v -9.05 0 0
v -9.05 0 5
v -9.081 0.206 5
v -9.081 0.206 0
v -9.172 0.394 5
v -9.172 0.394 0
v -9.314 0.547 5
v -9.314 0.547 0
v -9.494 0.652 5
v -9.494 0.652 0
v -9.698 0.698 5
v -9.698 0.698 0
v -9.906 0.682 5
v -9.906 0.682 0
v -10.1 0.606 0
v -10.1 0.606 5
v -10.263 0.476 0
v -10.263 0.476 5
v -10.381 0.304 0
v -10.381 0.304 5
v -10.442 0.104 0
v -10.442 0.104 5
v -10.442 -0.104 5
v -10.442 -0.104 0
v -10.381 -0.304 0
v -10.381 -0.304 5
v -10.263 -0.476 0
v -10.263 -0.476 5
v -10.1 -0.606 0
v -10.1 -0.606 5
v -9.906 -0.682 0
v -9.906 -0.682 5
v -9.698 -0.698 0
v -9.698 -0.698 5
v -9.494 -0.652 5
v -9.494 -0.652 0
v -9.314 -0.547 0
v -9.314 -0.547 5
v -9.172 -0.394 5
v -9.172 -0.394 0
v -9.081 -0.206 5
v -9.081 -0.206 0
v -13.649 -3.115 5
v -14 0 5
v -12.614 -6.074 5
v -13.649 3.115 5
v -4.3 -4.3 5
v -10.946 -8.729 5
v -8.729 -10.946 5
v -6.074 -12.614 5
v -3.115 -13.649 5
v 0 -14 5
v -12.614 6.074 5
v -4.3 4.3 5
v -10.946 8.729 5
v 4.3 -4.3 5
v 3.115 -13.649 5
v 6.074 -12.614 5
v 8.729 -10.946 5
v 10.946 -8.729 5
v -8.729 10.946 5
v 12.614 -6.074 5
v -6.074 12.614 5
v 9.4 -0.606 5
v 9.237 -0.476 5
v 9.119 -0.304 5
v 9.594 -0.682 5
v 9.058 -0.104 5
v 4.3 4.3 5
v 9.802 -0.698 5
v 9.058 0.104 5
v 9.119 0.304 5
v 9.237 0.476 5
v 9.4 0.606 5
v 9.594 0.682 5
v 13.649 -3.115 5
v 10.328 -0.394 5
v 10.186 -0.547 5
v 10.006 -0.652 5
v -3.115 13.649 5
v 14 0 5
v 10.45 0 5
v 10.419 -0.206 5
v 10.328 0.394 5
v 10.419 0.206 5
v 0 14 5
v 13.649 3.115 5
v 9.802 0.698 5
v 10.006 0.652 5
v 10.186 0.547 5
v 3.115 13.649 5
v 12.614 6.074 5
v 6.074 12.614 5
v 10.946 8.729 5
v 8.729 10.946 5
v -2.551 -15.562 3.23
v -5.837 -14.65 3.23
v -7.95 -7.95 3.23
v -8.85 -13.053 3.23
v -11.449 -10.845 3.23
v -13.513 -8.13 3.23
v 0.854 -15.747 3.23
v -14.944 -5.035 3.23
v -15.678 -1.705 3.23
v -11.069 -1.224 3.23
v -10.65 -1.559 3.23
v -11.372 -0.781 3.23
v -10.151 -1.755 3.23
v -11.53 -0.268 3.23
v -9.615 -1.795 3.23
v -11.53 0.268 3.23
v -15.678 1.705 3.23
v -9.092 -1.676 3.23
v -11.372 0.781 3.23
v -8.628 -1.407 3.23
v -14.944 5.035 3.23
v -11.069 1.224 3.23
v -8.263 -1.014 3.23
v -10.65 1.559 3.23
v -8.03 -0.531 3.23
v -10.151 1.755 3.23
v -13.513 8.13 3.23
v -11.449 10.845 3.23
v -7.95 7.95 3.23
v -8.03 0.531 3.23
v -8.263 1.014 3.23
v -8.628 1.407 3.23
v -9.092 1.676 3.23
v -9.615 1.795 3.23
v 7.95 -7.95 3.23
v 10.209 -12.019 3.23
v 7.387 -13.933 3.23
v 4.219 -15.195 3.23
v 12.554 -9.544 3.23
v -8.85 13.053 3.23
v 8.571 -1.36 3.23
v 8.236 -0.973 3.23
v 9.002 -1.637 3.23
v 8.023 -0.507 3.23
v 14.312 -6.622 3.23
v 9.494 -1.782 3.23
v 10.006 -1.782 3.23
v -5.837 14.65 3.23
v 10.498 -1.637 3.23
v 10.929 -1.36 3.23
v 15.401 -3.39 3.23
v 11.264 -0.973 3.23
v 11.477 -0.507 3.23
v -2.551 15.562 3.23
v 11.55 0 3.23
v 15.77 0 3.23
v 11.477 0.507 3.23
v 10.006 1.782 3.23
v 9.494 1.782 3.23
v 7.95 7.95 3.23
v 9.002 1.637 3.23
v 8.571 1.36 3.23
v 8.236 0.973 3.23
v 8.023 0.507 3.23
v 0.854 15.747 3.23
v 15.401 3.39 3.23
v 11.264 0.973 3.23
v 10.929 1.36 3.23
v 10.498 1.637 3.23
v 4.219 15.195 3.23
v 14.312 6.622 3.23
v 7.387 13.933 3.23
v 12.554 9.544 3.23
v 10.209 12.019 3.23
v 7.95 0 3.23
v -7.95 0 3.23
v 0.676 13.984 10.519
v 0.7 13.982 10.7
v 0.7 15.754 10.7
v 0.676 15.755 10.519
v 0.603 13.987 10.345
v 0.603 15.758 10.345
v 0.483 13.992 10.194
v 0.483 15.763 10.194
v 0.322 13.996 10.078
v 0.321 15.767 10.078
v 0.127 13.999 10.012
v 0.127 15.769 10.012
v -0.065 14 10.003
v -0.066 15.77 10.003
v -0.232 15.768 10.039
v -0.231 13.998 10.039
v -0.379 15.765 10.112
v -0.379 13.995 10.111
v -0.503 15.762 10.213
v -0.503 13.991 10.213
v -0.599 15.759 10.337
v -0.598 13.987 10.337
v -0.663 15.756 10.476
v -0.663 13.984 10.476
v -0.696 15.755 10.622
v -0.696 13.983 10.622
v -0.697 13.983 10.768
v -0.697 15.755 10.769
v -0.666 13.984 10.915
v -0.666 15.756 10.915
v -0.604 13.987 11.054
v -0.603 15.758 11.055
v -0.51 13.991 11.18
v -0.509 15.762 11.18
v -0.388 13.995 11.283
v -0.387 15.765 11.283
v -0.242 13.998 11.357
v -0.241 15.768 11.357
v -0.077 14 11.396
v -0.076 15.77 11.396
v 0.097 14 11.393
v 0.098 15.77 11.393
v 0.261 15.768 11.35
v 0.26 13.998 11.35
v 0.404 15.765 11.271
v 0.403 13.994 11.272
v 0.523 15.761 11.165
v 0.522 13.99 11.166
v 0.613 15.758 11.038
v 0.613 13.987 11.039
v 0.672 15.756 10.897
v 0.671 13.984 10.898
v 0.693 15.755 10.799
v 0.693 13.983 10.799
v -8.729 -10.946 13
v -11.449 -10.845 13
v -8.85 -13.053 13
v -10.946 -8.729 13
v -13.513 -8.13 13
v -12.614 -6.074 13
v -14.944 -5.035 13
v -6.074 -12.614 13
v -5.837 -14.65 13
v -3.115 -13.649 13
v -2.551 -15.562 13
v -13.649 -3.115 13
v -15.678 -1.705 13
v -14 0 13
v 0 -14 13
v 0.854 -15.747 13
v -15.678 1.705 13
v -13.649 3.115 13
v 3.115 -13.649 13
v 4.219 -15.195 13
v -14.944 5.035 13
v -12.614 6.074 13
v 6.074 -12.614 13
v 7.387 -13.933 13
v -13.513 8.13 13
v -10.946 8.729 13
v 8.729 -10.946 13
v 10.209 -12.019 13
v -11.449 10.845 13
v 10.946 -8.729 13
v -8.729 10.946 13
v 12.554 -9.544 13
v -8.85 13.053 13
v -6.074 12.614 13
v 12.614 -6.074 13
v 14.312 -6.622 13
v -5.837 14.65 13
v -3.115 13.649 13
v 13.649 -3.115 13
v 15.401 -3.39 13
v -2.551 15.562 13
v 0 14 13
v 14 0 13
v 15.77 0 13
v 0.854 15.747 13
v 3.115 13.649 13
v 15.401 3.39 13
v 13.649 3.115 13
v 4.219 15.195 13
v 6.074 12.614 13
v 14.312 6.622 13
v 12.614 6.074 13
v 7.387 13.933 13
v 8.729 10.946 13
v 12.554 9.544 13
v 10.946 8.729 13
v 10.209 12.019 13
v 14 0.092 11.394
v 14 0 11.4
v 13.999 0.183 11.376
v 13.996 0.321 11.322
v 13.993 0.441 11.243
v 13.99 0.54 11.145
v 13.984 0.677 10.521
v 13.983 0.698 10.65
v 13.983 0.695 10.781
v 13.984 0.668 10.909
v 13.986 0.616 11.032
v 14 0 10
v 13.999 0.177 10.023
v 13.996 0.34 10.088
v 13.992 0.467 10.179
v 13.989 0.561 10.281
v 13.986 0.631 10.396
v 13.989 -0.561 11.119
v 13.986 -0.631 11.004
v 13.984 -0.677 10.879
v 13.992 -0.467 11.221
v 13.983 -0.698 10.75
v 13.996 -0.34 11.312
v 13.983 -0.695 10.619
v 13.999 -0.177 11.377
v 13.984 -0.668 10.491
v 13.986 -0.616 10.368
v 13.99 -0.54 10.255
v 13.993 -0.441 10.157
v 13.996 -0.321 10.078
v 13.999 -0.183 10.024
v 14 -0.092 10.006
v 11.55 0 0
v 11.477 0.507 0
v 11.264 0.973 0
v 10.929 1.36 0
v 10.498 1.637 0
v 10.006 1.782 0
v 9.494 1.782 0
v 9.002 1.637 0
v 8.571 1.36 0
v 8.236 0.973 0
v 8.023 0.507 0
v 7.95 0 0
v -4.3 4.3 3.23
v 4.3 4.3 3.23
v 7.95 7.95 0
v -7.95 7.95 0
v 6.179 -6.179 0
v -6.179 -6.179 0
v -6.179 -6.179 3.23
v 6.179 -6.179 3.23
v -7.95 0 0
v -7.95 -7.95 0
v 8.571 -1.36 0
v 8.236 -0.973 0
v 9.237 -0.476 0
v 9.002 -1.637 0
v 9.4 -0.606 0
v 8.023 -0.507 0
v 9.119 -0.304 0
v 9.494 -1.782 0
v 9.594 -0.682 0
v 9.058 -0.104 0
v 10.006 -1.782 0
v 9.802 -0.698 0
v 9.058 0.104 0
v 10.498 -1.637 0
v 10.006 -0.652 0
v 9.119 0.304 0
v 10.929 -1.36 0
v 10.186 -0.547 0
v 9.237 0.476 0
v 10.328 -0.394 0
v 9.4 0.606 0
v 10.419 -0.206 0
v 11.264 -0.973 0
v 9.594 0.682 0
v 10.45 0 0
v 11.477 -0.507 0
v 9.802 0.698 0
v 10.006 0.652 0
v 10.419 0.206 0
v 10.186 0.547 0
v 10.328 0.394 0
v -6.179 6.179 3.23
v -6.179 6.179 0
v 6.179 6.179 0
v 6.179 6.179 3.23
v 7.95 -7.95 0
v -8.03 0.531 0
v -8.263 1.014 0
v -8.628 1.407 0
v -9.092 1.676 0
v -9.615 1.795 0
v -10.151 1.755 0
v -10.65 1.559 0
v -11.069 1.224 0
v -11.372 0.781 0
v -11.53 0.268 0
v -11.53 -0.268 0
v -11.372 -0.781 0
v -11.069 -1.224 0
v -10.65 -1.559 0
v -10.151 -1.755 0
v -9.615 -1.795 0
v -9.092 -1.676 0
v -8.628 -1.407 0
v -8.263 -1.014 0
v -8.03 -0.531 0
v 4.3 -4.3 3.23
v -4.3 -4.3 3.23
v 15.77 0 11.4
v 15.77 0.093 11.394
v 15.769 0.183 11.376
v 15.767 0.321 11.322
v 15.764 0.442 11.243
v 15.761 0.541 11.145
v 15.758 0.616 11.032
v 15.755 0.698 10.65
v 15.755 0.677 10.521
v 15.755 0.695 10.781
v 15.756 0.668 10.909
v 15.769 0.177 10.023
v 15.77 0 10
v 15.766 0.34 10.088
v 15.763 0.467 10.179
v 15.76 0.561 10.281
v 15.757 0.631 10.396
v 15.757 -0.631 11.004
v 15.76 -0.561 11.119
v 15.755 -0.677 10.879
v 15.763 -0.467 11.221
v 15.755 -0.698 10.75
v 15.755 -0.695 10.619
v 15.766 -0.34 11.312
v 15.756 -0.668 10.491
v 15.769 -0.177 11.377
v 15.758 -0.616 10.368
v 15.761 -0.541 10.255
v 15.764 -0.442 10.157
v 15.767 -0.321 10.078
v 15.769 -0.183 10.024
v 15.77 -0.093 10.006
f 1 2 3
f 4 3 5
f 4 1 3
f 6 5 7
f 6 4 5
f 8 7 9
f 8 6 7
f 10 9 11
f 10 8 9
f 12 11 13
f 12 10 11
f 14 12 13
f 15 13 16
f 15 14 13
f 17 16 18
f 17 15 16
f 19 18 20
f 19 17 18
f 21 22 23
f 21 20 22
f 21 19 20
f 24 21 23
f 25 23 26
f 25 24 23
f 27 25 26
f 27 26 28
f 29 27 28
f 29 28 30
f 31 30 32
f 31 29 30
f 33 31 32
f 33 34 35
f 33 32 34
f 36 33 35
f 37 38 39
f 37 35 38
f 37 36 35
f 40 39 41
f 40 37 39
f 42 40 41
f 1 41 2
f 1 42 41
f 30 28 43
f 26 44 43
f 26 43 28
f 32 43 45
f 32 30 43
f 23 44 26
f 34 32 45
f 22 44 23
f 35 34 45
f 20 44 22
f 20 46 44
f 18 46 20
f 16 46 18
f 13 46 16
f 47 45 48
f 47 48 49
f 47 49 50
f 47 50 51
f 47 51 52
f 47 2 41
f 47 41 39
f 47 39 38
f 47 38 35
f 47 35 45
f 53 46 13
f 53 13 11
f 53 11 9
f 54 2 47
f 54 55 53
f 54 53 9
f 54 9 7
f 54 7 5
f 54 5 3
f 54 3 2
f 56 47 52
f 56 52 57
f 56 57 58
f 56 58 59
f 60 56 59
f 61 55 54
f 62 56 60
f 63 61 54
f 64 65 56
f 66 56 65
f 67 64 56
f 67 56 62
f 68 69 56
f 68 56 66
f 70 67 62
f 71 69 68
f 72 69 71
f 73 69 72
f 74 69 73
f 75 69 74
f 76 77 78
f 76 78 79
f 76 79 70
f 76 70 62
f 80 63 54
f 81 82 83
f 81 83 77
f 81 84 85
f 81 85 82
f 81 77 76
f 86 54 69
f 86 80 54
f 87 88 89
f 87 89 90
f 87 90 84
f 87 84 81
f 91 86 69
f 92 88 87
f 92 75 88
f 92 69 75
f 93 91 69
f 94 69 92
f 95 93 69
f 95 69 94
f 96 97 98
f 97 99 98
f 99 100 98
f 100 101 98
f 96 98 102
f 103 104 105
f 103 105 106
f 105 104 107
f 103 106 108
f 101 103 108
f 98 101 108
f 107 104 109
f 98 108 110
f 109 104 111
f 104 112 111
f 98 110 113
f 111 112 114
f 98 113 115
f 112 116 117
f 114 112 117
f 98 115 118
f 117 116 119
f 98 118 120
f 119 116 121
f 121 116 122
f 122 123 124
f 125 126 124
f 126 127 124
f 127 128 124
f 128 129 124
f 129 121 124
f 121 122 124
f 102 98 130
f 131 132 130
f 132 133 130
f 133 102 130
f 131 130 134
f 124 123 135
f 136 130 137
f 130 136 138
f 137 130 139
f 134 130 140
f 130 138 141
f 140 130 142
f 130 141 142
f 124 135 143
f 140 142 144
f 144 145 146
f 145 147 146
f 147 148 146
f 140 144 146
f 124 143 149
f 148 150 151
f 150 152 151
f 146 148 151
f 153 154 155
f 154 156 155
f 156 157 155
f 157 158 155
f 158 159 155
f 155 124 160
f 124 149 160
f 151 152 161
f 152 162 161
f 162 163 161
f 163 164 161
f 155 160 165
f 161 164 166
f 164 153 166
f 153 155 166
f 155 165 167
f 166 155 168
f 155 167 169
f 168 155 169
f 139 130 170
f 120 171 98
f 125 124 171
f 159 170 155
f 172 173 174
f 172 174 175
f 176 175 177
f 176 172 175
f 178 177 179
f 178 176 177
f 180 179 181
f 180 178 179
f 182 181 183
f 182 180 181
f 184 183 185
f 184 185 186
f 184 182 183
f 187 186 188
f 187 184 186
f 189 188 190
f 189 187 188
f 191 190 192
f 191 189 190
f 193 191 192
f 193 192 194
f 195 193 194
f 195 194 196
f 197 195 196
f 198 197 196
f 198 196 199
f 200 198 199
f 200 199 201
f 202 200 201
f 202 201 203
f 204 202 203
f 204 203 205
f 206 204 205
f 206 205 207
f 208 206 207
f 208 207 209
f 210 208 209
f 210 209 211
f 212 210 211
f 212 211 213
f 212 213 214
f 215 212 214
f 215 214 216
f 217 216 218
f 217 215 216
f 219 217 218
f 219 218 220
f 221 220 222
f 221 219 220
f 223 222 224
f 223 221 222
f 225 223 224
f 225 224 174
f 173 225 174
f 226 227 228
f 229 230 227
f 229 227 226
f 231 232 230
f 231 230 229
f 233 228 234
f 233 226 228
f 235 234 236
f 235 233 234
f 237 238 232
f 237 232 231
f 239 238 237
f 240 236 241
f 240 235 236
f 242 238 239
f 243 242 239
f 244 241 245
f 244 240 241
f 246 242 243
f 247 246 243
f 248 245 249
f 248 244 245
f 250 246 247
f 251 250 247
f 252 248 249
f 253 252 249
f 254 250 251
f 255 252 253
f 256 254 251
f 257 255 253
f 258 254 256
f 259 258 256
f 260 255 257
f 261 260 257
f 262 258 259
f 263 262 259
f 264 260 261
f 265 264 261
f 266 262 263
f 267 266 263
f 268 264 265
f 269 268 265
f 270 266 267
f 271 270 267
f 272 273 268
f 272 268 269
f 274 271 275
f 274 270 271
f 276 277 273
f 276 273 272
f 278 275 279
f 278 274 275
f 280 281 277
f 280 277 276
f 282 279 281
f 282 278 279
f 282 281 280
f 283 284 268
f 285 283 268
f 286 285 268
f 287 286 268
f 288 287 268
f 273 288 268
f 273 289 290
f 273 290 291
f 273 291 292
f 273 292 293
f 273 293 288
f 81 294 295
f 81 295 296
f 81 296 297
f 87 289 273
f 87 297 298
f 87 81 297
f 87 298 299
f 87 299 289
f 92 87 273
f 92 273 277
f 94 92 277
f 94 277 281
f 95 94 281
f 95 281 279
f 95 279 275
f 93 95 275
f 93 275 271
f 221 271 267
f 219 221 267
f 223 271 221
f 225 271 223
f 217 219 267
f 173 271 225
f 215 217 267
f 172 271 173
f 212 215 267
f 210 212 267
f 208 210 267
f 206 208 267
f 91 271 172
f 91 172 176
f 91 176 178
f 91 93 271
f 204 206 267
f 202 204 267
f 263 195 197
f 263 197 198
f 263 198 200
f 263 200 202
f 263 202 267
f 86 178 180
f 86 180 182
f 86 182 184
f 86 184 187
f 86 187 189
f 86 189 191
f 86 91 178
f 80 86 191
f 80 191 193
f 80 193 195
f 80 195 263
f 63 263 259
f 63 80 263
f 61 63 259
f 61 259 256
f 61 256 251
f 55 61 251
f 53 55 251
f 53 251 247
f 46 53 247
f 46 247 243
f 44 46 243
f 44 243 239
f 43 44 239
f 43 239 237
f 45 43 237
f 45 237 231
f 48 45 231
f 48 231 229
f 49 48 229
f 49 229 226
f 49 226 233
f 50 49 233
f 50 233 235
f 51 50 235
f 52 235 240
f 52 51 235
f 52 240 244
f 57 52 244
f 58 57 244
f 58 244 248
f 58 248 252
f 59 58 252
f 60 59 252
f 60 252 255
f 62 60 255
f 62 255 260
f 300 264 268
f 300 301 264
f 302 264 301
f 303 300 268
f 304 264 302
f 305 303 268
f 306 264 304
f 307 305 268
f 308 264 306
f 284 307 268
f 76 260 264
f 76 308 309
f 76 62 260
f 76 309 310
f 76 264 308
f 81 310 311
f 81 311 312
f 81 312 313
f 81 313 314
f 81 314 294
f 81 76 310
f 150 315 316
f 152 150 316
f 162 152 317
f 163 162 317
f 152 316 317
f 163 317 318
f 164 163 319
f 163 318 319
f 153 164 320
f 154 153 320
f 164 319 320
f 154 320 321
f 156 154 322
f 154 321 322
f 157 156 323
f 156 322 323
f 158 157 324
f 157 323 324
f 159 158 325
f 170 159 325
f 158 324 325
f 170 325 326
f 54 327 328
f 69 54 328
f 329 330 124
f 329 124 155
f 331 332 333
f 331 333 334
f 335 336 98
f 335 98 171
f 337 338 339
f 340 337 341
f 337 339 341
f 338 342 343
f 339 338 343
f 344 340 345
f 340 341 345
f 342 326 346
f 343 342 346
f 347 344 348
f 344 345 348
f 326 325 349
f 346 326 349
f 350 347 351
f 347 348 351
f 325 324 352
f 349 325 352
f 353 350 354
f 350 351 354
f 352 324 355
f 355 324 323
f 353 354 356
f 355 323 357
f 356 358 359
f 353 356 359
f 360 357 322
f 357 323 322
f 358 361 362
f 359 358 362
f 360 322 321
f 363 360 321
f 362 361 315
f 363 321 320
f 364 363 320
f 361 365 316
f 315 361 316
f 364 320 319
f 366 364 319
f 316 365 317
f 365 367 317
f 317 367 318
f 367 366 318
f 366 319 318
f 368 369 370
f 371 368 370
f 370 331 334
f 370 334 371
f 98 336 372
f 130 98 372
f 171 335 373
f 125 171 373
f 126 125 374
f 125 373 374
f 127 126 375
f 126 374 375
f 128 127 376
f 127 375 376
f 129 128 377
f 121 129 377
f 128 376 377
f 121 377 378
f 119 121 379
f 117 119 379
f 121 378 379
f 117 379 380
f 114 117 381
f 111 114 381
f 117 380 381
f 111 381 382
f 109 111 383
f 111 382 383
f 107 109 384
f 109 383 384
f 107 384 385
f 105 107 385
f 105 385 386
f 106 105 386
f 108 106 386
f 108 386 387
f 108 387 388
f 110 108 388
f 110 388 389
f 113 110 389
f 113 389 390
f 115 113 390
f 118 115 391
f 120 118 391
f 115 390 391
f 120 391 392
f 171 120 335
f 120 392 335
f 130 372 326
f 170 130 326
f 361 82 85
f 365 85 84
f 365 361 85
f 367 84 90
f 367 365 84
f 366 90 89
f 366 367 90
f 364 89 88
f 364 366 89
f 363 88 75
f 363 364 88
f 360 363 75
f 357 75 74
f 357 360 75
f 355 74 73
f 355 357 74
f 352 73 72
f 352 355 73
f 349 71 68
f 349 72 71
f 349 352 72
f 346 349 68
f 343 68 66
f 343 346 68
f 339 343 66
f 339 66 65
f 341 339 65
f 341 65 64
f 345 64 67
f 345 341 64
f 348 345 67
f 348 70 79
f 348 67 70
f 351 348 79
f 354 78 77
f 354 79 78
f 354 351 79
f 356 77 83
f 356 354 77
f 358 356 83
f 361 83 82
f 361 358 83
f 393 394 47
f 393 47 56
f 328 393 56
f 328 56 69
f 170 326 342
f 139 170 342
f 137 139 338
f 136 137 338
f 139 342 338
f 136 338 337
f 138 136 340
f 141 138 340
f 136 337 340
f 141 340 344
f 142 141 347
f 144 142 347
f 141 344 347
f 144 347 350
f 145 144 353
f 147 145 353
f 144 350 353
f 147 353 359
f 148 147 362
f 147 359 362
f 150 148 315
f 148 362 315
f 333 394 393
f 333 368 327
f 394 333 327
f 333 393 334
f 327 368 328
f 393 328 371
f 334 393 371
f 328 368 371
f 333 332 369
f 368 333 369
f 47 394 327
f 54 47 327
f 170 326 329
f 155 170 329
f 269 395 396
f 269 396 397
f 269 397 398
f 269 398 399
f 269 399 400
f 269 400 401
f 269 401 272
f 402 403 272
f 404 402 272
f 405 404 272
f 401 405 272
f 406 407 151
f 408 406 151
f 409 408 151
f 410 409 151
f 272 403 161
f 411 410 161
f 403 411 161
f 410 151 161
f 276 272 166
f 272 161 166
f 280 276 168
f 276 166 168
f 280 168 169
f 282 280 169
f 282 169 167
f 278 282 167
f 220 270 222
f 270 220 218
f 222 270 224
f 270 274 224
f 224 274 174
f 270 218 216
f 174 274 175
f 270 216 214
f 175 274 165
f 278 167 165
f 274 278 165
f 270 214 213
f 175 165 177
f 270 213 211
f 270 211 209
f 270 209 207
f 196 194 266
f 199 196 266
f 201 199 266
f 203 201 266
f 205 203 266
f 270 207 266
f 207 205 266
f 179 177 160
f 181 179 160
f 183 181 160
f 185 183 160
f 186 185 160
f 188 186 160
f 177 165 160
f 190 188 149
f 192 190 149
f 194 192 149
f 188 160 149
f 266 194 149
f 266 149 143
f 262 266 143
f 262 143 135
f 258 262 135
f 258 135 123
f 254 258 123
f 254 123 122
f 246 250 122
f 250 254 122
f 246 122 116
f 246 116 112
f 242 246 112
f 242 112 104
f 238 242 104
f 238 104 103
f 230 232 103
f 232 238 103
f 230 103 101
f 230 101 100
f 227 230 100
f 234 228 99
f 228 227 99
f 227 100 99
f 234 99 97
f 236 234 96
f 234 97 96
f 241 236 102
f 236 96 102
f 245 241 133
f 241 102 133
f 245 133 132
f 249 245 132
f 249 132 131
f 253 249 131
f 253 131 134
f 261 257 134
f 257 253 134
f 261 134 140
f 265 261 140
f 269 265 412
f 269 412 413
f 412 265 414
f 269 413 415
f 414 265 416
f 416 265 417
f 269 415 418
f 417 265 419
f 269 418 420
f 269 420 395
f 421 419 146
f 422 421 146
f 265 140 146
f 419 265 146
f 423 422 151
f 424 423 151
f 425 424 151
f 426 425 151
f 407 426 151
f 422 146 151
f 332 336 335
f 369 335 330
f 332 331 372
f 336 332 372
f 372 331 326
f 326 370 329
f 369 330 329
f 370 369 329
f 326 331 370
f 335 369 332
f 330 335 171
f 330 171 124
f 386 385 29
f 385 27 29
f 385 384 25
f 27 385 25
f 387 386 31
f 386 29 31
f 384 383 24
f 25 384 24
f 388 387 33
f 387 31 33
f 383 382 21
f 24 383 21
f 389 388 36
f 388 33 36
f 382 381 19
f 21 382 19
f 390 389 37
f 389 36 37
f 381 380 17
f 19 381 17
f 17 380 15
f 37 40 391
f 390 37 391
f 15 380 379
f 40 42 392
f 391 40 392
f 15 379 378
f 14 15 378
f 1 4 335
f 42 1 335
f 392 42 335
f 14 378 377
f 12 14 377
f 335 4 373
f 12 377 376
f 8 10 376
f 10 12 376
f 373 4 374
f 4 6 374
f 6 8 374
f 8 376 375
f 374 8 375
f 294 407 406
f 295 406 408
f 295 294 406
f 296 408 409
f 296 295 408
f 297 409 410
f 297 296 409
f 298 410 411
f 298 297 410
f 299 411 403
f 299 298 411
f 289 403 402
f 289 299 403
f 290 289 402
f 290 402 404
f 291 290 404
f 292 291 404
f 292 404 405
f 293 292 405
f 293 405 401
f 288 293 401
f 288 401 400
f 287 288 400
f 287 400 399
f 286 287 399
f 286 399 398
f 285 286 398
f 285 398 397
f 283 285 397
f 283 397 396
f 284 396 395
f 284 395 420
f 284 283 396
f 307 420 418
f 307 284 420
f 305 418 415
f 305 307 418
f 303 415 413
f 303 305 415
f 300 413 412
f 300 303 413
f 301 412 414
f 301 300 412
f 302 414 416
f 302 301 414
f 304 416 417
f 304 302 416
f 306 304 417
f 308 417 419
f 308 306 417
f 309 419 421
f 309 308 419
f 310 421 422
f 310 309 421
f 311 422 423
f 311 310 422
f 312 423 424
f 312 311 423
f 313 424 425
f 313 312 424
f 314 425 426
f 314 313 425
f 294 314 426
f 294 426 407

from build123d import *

# Parameters (mm, degrees)
CYLINDER001_R           = 1.8
CYLINDER001_DEPTH       = 3.23
THICKNESS002_T          = -1.1
CYLINDER003_R           = 1.8
CYLINDER003_DEPTH       = 3.23
THICKNESS003_T          = -1.1
CYLINDER006_R           = 0.7
CYLINDER006_DEPTH       = 3
CYLINDER006_ROLL_ANGLE  = -90
CYLINDER005_R           = 0.7
CYLINDER005_DEPTH       = 3
CYLINDER005_PITCH_ANGLE = 90
CYLINDER004_R           = 0.7
CYLINDER004_DEPTH       = 10
CYLINDER002_R           = 0.7
CYLINDER002_DEPTH       = 10
BOX001_W                = 8.6
BOX001_H                = 8.6
BOX001_DEPTH            = 1.77
CYLINDER_R              = 14
CYLINDER_DEPTH          = 8
THICKNESS_T             = 1.77
BOX_W                   = 15.9
BOX_H                   = 15.9
BOX_DEPTH               = 3.23
THICKNESS001_T          = -1.771


with BuildPart() as thickness002:
    # Cylinder001 → Cylinder001 (new body)
    with BuildSketch(Plane.XY):
        Circle(CYLINDER001_R)
    extrude(amount=CYLINDER001_DEPTH)

    # Thickness002
    thickness002_openings = [thickness002.faces().sort_by_distance(p)[0] for p in [
        (0, 0, 3.23),
        (0, 0, 0),
    ]]
    offset(amount=THICKNESS002_T, openings=thickness002_openings)


with BuildPart() as thickness002_1:
    # Thickness002 placement: moved
    add(thickness002.part.moved(Location((9.75, 0, 0))))


with BuildPart() as thickness003:
    # Cylinder003 → Cylinder003 (new body)
    with BuildSketch(Plane.XY):
        Circle(CYLINDER003_R)
    extrude(amount=CYLINDER003_DEPTH)

    # Thickness003
    thickness003_openings = [thickness003.faces().sort_by_distance(p)[0] for p in [
        (0, 0, 3.23),
        (0, 0, 0),
    ]]
    offset(amount=THICKNESS003_T, openings=thickness003_openings)


with BuildPart() as thickness003_1:
    # Thickness003 placement: moved
    add(thickness003.part.moved(Location((-9.75, 0, 0))))


with BuildPart() as cylinder006:
    # Cylinder006 → Cylinder006 (new body)
    with BuildSketch(Plane.XY):
        Circle(CYLINDER006_R)
    extrude(amount=CYLINDER006_DEPTH)


with BuildPart() as cylinder006_1:
    # Cylinder006 roll: moved
    add(cylinder006.part.rotate(Axis((0, 0, 0), (1, 0, 0)), CYLINDER006_ROLL_ANGLE))


with BuildPart() as cylinder006_2:
    # Cylinder006 placement: moved
    add(cylinder006_1.part.moved(Location((0, 13, 10.7))))


with BuildPart() as cylinder005:
    # Cylinder005 → Cylinder005 (new body)
    with BuildSketch(Plane.XY):
        Circle(CYLINDER005_R)
    extrude(amount=CYLINDER005_DEPTH)


with BuildPart() as cylinder005_1:
    # Cylinder005 pitch: moved
    add(cylinder005.part.rotate(Axis((0, 0, 0), (0, 1, 0)), CYLINDER005_PITCH_ANGLE))


with BuildPart() as cylinder005_2:
    # Cylinder005 placement: moved
    add(cylinder005_1.part.moved(Location((13, 0, 10.7))))


with BuildPart() as cylinder004:
    # Cylinder004 → Cylinder004 (new body)
    with BuildSketch(Plane(origin=(-9.75, 0, 0), x_dir=(1, 0, 0), z_dir=(0, 0, 1))):
        Circle(CYLINDER004_R)
    extrude(amount=CYLINDER004_DEPTH)


with BuildPart() as cylinder002:
    # Cylinder002 → Cylinder002 (new body)
    with BuildSketch(Plane(origin=(9.75, 0, 0), x_dir=(1, 0, 0), z_dir=(0, 0, 1))):
        Circle(CYLINDER002_R)
    extrude(amount=CYLINDER002_DEPTH)


with BuildPart() as cube001:
    # Box001 → Box001 (new body)
    with BuildSketch(Plane(origin=(-4.3, -4.3, 3.23), x_dir=(1, 0, 0), z_dir=(0, 0, 1))):
        with Locations((4.3, 4.3)):
            Rectangle(BOX001_W, BOX001_H)
    extrude(amount=BOX001_DEPTH)


with BuildPart() as cut004:
    # Cylinder → Cylinder (new body)
    with BuildSketch(Plane.XY.offset(5)):
        Circle(CYLINDER_R)
    extrude(amount=CYLINDER_DEPTH)

    # Thickness
    thickness_openings = [cut004.faces().sort_by_distance(p)[0] for p in [
        (0, 0, 13),
    ]]
    offset(amount=THICKNESS_T, openings=thickness_openings, kind=Kind.INTERSECTION)

    # Cut: cut Cube001
    add(cube001.part, mode=Mode.SUBTRACT)

    # Cut001: cut Cylinder002
    add(cylinder002.part, mode=Mode.SUBTRACT)

    # Cut002: cut Cylinder004
    add(cylinder004.part, mode=Mode.SUBTRACT)

    # Cut003: cut Cylinder005
    add(cylinder005_2.part, mode=Mode.SUBTRACT)

    # Cut004: cut Cylinder006
    add(cylinder006_2.part, mode=Mode.SUBTRACT)


with BuildPart() as fusion:
    # Box → Box (new body)
    with BuildSketch(Plane(origin=(-7.95, -7.95, 0), x_dir=(1, 0, 0), z_dir=(0, 0, 1))):
        with Locations((7.95, 7.95)):
            Rectangle(BOX_W, BOX_H)
    extrude(amount=BOX_DEPTH)

    # Thickness001
    thickness001_openings = [fusion.faces().sort_by_distance(p)[0] for p in [
        (0, 0, 3.23),
        (0, 0, 0),
    ]]
    offset(amount=THICKNESS001_T, openings=thickness001_openings, kind=Kind.INTERSECTION)

    # Fusion: union Thickness002, Thickness003, Cut004
    add(thickness002_1.part)
    add(thickness003_1.part)
    add(cut004.part)


solid = fusion.part
